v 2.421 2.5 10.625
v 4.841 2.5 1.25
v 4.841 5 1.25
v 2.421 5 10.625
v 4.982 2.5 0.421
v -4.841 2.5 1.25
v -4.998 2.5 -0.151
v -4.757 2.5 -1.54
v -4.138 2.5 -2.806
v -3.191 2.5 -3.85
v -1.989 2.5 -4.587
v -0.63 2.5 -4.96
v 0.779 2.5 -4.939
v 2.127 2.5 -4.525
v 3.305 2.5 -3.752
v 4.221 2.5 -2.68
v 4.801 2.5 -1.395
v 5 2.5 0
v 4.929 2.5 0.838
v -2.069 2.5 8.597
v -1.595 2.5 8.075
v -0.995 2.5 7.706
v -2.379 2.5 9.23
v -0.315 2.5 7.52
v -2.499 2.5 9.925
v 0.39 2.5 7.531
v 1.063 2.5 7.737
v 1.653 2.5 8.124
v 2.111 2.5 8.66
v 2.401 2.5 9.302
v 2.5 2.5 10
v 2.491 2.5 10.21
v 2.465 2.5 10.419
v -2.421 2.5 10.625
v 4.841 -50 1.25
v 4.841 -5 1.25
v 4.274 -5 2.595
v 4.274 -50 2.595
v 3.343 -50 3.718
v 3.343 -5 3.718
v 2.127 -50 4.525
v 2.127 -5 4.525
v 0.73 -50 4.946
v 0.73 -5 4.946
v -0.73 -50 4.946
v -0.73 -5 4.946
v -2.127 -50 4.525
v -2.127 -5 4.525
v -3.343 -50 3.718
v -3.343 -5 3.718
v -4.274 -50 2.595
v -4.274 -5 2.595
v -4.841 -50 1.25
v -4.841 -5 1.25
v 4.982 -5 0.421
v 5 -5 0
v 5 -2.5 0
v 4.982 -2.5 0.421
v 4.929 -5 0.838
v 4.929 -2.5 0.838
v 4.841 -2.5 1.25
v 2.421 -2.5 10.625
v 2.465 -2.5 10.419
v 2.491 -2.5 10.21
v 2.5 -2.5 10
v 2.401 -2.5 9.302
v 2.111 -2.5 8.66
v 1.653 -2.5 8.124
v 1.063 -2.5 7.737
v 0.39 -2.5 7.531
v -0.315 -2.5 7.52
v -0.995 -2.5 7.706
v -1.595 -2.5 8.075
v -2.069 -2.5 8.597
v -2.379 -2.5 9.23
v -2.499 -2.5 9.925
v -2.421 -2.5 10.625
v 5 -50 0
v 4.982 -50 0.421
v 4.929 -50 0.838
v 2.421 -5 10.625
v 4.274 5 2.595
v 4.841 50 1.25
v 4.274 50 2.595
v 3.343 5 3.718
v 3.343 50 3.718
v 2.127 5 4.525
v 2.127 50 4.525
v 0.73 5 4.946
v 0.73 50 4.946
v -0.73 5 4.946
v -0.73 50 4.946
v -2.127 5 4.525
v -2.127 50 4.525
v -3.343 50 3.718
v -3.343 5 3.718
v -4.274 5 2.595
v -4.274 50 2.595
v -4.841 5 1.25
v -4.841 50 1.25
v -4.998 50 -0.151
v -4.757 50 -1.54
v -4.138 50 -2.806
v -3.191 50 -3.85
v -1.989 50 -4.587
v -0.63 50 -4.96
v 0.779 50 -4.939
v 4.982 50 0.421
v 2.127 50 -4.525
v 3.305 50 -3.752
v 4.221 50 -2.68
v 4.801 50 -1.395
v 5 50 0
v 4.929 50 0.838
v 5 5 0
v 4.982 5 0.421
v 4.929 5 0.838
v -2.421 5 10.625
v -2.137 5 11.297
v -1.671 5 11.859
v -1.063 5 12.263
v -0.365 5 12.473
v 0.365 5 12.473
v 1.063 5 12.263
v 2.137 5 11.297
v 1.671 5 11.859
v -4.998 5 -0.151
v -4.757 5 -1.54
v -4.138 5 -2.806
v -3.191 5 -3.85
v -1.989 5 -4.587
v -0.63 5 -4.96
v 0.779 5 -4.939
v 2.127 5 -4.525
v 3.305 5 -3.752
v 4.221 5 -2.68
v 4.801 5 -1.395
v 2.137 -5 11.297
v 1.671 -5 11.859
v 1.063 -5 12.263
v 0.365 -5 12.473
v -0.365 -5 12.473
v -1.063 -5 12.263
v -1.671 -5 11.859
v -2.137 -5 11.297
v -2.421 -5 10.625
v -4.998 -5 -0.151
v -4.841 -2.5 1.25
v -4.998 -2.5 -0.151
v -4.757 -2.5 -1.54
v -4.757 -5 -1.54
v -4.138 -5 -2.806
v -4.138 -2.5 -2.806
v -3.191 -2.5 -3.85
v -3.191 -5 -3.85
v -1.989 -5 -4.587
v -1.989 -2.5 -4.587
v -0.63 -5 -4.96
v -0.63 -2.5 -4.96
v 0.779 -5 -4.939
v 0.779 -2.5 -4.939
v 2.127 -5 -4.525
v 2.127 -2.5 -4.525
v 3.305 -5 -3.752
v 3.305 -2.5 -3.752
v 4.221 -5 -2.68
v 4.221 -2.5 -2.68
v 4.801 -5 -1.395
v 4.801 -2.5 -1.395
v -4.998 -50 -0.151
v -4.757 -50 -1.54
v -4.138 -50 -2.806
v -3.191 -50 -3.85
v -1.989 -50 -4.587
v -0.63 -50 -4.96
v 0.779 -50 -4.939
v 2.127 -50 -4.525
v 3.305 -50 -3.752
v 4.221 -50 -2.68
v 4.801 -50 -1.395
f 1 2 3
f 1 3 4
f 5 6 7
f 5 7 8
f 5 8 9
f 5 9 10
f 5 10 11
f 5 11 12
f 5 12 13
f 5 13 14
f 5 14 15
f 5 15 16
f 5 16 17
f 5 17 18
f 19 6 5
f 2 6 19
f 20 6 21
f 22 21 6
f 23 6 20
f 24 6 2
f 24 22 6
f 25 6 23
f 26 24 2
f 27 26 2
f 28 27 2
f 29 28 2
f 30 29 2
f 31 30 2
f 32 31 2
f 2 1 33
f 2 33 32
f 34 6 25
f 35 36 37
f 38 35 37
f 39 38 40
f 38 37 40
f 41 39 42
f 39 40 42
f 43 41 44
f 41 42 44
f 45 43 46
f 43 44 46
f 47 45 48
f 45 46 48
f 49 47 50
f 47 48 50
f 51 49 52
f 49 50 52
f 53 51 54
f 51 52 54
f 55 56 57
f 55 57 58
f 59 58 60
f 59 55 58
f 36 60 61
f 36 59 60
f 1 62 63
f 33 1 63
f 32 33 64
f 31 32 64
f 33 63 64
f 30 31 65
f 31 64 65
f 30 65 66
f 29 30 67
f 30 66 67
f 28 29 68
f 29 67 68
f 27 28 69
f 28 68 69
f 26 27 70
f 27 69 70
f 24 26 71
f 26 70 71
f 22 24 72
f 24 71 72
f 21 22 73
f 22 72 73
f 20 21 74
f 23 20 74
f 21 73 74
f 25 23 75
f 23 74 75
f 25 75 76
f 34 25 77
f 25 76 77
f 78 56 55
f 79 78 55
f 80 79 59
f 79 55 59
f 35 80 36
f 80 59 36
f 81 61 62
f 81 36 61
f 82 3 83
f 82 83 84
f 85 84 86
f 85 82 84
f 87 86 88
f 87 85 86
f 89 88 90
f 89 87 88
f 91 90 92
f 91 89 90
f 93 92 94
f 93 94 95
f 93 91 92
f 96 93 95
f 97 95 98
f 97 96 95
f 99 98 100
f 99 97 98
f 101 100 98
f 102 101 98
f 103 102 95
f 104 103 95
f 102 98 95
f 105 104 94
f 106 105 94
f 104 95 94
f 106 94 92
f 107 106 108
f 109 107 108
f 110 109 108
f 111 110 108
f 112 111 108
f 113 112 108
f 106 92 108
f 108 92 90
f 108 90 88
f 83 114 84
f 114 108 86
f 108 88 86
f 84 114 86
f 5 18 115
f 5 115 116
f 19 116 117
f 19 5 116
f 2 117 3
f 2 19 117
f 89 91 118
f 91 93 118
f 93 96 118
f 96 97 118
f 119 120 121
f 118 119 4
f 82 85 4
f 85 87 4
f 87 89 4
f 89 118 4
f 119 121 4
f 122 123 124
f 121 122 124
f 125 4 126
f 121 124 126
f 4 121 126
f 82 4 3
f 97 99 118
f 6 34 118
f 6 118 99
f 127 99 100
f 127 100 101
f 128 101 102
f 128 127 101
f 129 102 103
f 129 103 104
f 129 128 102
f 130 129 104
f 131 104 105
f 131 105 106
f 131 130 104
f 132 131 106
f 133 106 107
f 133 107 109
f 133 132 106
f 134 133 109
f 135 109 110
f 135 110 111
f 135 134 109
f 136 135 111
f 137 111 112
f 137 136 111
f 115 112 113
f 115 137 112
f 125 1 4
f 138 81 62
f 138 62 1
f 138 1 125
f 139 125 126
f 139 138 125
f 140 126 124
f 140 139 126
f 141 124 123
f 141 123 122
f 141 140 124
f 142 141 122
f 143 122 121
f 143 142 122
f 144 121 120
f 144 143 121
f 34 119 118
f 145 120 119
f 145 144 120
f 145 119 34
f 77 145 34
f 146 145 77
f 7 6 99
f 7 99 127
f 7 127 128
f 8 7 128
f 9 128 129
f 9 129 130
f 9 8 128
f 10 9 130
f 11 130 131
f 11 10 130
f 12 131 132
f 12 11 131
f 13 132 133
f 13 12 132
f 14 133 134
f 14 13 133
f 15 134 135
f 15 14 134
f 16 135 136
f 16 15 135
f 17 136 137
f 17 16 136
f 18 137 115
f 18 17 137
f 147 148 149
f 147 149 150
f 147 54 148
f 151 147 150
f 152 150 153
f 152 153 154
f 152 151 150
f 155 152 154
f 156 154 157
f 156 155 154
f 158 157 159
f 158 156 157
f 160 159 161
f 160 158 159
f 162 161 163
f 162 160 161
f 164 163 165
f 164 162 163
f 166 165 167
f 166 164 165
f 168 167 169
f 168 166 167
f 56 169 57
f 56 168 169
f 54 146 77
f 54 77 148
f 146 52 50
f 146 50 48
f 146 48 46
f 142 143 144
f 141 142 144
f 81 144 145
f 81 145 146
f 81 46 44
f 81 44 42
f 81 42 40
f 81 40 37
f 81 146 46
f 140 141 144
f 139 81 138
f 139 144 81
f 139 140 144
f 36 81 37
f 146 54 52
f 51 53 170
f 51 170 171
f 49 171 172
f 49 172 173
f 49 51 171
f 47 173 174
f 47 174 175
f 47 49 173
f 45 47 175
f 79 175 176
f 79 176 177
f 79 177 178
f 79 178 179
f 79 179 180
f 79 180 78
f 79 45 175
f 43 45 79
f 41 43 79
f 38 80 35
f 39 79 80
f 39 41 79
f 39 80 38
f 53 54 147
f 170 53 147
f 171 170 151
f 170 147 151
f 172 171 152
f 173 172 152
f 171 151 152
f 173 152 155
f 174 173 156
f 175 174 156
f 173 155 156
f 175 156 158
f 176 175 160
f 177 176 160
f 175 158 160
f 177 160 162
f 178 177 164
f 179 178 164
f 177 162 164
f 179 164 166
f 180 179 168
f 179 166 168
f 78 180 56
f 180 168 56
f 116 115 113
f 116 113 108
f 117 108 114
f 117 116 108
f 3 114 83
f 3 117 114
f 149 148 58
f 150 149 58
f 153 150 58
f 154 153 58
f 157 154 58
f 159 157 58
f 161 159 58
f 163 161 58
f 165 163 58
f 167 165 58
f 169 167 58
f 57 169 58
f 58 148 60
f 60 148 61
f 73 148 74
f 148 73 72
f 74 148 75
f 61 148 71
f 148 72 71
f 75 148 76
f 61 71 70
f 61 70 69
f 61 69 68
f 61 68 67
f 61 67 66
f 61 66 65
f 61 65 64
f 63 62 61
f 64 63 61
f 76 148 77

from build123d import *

# Parameters (mm, degrees)
F1_DEPTH = 5
F2_DEPTH = 50
F3_DEPTH = 2.5


with BuildPart() as f1:
    # F0 (on Front) → F1 (new body, symmetric)
    with BuildSketch(Plane.XZ):
        with BuildLine():
            ThreePointArc((2.5, 10), (2.4800742407, 10.3150107312), (2.4206145914, 10.625))
            ThreePointArc((2.4206145914, 10.625), (0, 12.5), (-2.4206145914, 10.625))
            ThreePointArc((-2.4206145914, 10.625), (-0.3150107312, 7.5199257593), (2.5, 10))
        make_face()
        with BuildLine():
            ThreePointArc((-4.8412291828, 1.25), (0, 5), (4.8412291828, 1.25))
            Line((4.8412291828, 1.25), (2.4206145914, 10.625))
            ThreePointArc((2.4206145914, 10.625), (2.4800742407, 10.3150107312), (2.5, 10))
            ThreePointArc((2.5, 10), (-0.3150107312, 7.5199257593), (-2.4206145914, 10.625))
            Line((-2.4206145914, 10.625), (-4.8412291828, 1.25))
        make_face()
        with BuildLine():
            ThreePointArc((-4.8412291828, 1.25), (-0.6300214624, -4.9601484813), (5, 0))
            ThreePointArc((5, 0), (4.9601484813, 0.6300214624), (4.8412291828, 1.25))
            ThreePointArc((4.8412291828, 1.25), (0, 5), (-4.8412291828, 1.25))
        make_face()
    extrude(amount=F1_DEPTH, both=True)

    # F0 (on Front) → F2 (join, symmetric)
    with BuildSketch(Plane.XZ):
        with BuildLine():
            ThreePointArc((-4.8412291828, 1.25), (-0.6300214624, -4.9601484813), (5, 0))
            ThreePointArc((5, 0), (4.9601484813, 0.6300214624), (4.8412291828, 1.25))
            ThreePointArc((4.8412291828, 1.25), (0, 5), (-4.8412291828, 1.25))
        make_face()
    extrude(amount=F2_DEPTH, both=True)

    # F0 (on Front) → F3 (cut, symmetric)
    with BuildSketch(Plane.XZ):
        with BuildLine():
            ThreePointArc((-4.8412291828, 1.25), (0, 5), (4.8412291828, 1.25))
            Line((4.8412291828, 1.25), (2.4206145914, 10.625))
            ThreePointArc((2.4206145914, 10.625), (2.4800742407, 10.3150107312), (2.5, 10))
            ThreePointArc((2.5, 10), (-0.3150107312, 7.5199257593), (-2.4206145914, 10.625))
            Line((-2.4206145914, 10.625), (-4.8412291828, 1.25))
        make_face()
        with BuildLine():
            ThreePointArc((-4.8412291828, 1.25), (-0.6300214624, -4.9601484813), (5, 0))
            ThreePointArc((5, 0), (4.9601484813, 0.6300214624), (4.8412291828, 1.25))
            ThreePointArc((4.8412291828, 1.25), (0, 5), (-4.8412291828, 1.25))
        make_face()
    extrude(amount=F3_DEPTH, both=True, mode=Mode.SUBTRACT)


solid = f1.part
